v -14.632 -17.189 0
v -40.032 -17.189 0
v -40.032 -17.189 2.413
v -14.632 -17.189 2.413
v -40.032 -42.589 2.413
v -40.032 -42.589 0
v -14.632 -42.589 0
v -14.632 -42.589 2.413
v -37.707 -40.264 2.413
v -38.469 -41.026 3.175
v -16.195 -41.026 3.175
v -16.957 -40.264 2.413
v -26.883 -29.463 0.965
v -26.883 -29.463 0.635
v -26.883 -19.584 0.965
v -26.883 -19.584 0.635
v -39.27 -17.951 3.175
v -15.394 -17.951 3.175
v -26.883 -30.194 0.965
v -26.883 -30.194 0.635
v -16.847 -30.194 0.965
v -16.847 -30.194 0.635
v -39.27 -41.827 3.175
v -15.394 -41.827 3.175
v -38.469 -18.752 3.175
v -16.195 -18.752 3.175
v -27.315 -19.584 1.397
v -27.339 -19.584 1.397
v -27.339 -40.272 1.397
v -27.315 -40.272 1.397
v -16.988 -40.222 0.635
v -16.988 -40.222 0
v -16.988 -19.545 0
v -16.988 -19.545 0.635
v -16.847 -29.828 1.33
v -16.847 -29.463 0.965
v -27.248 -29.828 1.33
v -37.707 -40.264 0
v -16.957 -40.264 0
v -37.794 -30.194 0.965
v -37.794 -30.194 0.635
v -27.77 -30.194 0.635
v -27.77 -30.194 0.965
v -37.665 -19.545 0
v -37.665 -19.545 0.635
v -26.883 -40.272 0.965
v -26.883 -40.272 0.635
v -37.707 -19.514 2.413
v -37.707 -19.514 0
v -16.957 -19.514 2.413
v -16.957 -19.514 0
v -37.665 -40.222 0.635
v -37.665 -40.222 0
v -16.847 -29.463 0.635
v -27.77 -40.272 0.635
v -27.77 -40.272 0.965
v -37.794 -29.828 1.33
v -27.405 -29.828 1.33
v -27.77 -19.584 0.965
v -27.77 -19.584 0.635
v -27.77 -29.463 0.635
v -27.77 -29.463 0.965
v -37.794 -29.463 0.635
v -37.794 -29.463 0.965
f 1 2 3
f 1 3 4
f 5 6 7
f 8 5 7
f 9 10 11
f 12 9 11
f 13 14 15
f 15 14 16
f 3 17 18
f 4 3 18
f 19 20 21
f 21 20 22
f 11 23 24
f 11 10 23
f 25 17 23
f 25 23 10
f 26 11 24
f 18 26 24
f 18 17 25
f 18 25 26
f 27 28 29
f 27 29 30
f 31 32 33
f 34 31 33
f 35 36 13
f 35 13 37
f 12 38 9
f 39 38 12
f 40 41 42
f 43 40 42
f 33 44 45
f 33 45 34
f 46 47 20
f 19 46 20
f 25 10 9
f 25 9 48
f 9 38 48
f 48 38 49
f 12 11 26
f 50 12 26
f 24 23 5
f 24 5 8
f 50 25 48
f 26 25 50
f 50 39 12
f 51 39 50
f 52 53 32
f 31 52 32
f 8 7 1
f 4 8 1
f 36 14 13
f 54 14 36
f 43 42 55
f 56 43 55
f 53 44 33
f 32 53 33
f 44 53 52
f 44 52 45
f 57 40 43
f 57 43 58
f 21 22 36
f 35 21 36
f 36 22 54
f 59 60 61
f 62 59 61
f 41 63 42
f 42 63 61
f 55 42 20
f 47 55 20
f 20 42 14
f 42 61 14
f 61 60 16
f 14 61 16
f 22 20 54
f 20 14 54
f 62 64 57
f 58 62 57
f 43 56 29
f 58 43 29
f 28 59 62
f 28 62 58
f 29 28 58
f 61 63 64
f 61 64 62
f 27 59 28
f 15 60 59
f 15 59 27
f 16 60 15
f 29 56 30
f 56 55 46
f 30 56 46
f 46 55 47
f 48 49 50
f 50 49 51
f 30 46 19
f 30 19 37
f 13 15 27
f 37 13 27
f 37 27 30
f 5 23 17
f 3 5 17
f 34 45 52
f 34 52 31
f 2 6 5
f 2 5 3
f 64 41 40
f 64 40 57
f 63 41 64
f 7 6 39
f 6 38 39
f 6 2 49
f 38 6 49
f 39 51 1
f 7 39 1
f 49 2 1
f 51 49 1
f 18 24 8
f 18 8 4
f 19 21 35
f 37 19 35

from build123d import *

# Parameters (mm, degrees)
F0_W         = 25.4
F0_H         = 25.4
F0_W_2       = 20.7499843091
F0_H_2       = 20.7499843091
F1_DEPTH     = 3.175
F2_W         = 20.6769648939
F2_H         = 20.6769648939
F3_DEPTH     = 0.635
F5_W         = 0.8874461055
F5_H         = 9.8797418177
F5_H_2       = 0.7302556187
F5_W_2       = 10.0232437253
F5_W_3       = 10.0361239165
F5_H_3       = 10.0780427456
F6_DEPTH     = 0.762
F7_T1_DEPTH  = 11.1336964395
F7_T3_DEPTH  = 10.9901945319
F7_T5_DEPTH  = 11.1465766307
F7_T7_DEPTH  = 11.1884954598
F7_T12_DEPTH = 12.2441491537
F7_T17_DEPTH = 12.2441491537
F7_T22_DEPTH = 12.1006472461
F7_T27_DEPTH = 12.1006472461
F7_T32_DEPTH = 12.2570293449
F7_T37_DEPTH = 12.2570293449
F7_T42_DEPTH = 12.298948174
F7_T47_DEPTH = 12.298948174
F7_T53_DEPTH = 12.2441491537
F7_T58_DEPTH = 12.298948174
F7_T66_DEPTH = 12.1006472461
F7_T71_DEPTH = 12.2441491537
F7_T79_DEPTH = 12.2570293449
F7_T84_DEPTH = 12.1006472461
F7_T92_DEPTH = 12.298948174
F7_T97_DEPTH = 12.2570293449
F8_SIZE      = 0.762


# Not quite as in the source:
# - a fillet or chamfer that OpenCascade refuses, or shapes differently, is made with other operations: its cross-section is extruded or revolved along the edge and cut away or added


with BuildPart() as f1:
    # F0 (on Top) → F1 (new body)
    with BuildSketch(Plane.XY):
        with Locations((-27.3323692381, -29.8893228173)):
            Rectangle(F0_W, F0_H)
        with Locations((-27.3323692381, -29.8893228173)):
            Rectangle(F0_W_2, F0_H_2, mode=Mode.SUBTRACT)
    extrude(amount=F1_DEPTH)

    # F8
    f8_edges = [f1.edges().sort_by_distance(p)[0] for p in [
        (-14.632369, -29.889323, 3.175),
        (-27.332369, -42.589323, 3.175),
        (-40.032369, -29.889323, 3.175),
        (-27.332369, -17.189323, 3.175),
        (-37.707361, -29.889323, 3.175),
        (-27.332369, -19.514331, 3.175),
        (-16.957377, -29.889323, 3.175),
        (-27.332369, -40.264315, 3.175),
    ]]
    chamfer(f8_edges, length=F8_SIZE)


with BuildPart() as f3:
    # F2 (on Top) → F3 (new body)
    with BuildSketch(Plane.XY):
        with Locations((-27.32637804, -29.8832794651)):
            Rectangle(F2_W, F2_H)
    extrude(amount=F3_DEPTH)


with BuildPart() as f6:
    # F5 (on face) → F6 (new body)
    with BuildSketch(Plane.XY.offset(0.635)):
        with Locations((-27.3266136646, -24.5234593749)):
            Rectangle(F5_W, F5_H)
        with Locations((-27.3266136646, -29.8284580931)):
            Rectangle(F5_W, F5_H_2)
        with Locations((-32.78195858, -29.8284580931)):
            Rectangle(F5_W_2, F5_H_2)
        with Locations((-21.8648286536, -29.8284580931)):
            Rectangle(F5_W_3, F5_H_2)
        with Locations((-27.3266136646, -35.2326072752)):
            Rectangle(F5_W, F5_H_3)
    extrude(amount=F6_DEPTH)

    # F7: chamfer of 0.4318 on 8 edges, made by hand

    # F7_s2 → F7_t1 (cut)
    with BuildSketch(Plane.YZ.offset(-38.9040331569)):
        Polygon((-30.1935859025, 0.9652), (-29.7617859025, 1.397), (-30.1935859025, 1.397), align=None)
        Polygon((-29.4633302838, 0.9652), (-29.8951302838, 1.397), (-29.4633302838, 1.397), align=None)
    extrude(amount=F7_T1_DEPTH, mode=Mode.SUBTRACT)

    # F7_s4 → F7_t3 (cut)
    with BuildSketch(Plane.XZ.offset(18.4731357518)):
        Polygon((-27.7703367174, 0.9652), (-27.3385367174, 1.397), (-27.7703367174, 1.397), align=None)
        Polygon((-26.8828906119, 0.9652), (-27.3146906119, 1.397), (-26.8828906119, 1.397), align=None)
    extrude(amount=F7_T3_DEPTH, mode=Mode.SUBTRACT)

    # F7_s6 → F7_t5 (cut)
    with BuildSketch(Plane.YZ.offset(-26.8828906119)):
        Polygon((-29.4633302838, 0.9652), (-29.8951302838, 1.397), (-29.4633302838, 1.397), align=None)
        Polygon((-30.1935859025, 0.9652), (-29.7617859025, 1.397), (-30.1935859025, 1.397), align=None)
    extrude(amount=F7_T5_DEPTH, mode=Mode.SUBTRACT)

    # F7_s8 → F7_t7 (cut)
    with BuildSketch(Plane.XZ.offset(30.1935859025)):
        Polygon((-26.8828906119, 0.9652), (-27.3146906119, 1.397), (-26.8828906119, 1.397), align=None)
        Polygon((-27.7703367174, 0.9652), (-27.3385367174, 1.397), (-27.7703367174, 1.397), align=None)
    extrude(amount=F7_T7_DEPTH, mode=Mode.SUBTRACT)


with BuildPart() as f7_tool10:
    # F7_s11 → F7_t12 (new body)
    with BuildSketch(Plane.YZ.offset(-38.9040331569)):
        Polygon((-30.1935859025, 0.9652), (-29.7617859025, 1.397), (-30.1935859025, 1.397), align=None)
    extrude(amount=F7_T12_DEPTH)

    split(bisect_by=Plane.YZ.offset(-26.8828906119), keep=Keep.TOP)


with BuildPart() as f6_1:
    add(f6.part)

    # F7_t9: cut F7_tool10
    add(f7_tool10.part, mode=Mode.SUBTRACT)


with BuildPart() as f7_tool15:
    # F7_s16 → F7_t17 (new body)
    with BuildSketch(Plane.YZ.offset(-26.6598840032)):
        Polygon((-29.4633302838, 0.9652), (-29.8951302838, 1.397), (-29.4633302838, 1.397), align=None)
    extrude(amount=-F7_T17_DEPTH)

    split(bisect_by=Plane.YZ.offset(-26.8828906119), keep=Keep.TOP)


with BuildPart() as f6_2:
    add(f6_1.part)

    # F7_t14: cut F7_tool15
    add(f7_tool15.part, mode=Mode.SUBTRACT)


with BuildPart() as f7_tool20:
    # F7_s21 → F7_t22 (new body)
    with BuildSketch(Plane.XZ.offset(18.4731357518)):
        Polygon((-27.7703367174, 0.9652), (-27.3385367174, 1.397), (-27.7703367174, 1.397), align=None)
    extrude(amount=F7_T22_DEPTH)

    split(bisect_by=Plane.XZ.offset(30.1935859025), keep=Keep.TOP)


with BuildPart() as f6_3:
    add(f6_2.part)

    # F7_t19: cut F7_tool20
    add(f7_tool20.part, mode=Mode.SUBTRACT)


with BuildPart() as f7_tool25:
    # F7_s26 → F7_t27 (new body)
    with BuildSketch(Plane.XZ.offset(30.573782998)):
        Polygon((-26.8828906119, 0.9652), (-27.3146906119, 1.397), (-26.8828906119, 1.397), align=None)
    extrude(amount=-F7_T27_DEPTH)

    split(bisect_by=Plane.XZ.offset(30.1935859025), keep=Keep.TOP)


with BuildPart() as f6_4:
    add(f6_3.part)

    # F7_t24: cut F7_tool25
    add(f7_tool25.part, mode=Mode.SUBTRACT)


with BuildPart() as f7_tool30:
    # F7_s31 → F7_t32 (new body)
    with BuildSketch(Plane.YZ.offset(-15.7363139812)):
        Polygon((-29.4633302838, 0.9652), (-29.8951302838, 1.397), (-29.4633302838, 1.397), align=None)
    extrude(amount=-F7_T32_DEPTH)

    split(bisect_by=Plane.YZ.offset(-27.7703367174), keep=Keep.BOTTOM)


with BuildPart() as f6_5:
    add(f6_4.part)

    # F7_t29: cut F7_tool30
    add(f7_tool30.part, mode=Mode.SUBTRACT)


with BuildPart() as f7_tool35:
    # F7_s36 → F7_t37 (new body)
    with BuildSketch(Plane.YZ.offset(-27.9933433261)):
        Polygon((-30.1935859025, 0.9652), (-29.7617859025, 1.397), (-30.1935859025, 1.397), align=None)
    extrude(amount=F7_T37_DEPTH)

    split(bisect_by=Plane.YZ.offset(-27.7703367174), keep=Keep.BOTTOM)


with BuildPart() as f6_6:
    add(f6_5.part)

    # F7_t34: cut F7_tool35
    add(f7_tool35.part, mode=Mode.SUBTRACT)


with BuildPart() as f7_tool40:
    # F7_s41 → F7_t42 (new body)
    with BuildSketch(Plane.XZ.offset(41.3820813622)):
        Polygon((-26.8828906119, 0.9652), (-27.3146906119, 1.397), (-26.8828906119, 1.397), align=None)
    extrude(amount=-F7_T42_DEPTH)

    split(bisect_by=Plane.XZ.offset(29.4633302838), keep=Keep.BOTTOM)


with BuildPart() as f6_7:
    add(f6_6.part)

    # F7_t39: cut F7_tool40
    add(f7_tool40.part, mode=Mode.SUBTRACT)


with BuildPart() as f7_tool45:
    # F7_s46 → F7_t47 (new body)
    with BuildSketch(Plane.XZ.offset(29.0831331882)):
        Polygon((-27.7703367174, 0.9652), (-27.3385367174, 1.397), (-27.7703367174, 1.397), align=None)
    extrude(amount=F7_T47_DEPTH)

    split(bisect_by=Plane.XZ.offset(29.4633302838), keep=Keep.BOTTOM)


with BuildPart() as f6_8:
    add(f6_7.part)

    # F7_t44: cut F7_tool45
    add(f7_tool45.part, mode=Mode.SUBTRACT)


with BuildPart() as f7_tool51:
    # F7_s52 → F7_t53 (new body)
    with BuildSketch(Plane.YZ.offset(-38.9040331569)):
        Polygon((-30.1935859025, 0.9652), (-29.7617859025, 1.397), (-30.1935859025, 1.397), align=None)
    extrude(amount=F7_T53_DEPTH)

    split(bisect_by=Plane.YZ.offset(-27.7703367174), keep=Keep.TOP)

    split(bisect_by=Plane.YZ.offset(-26.8828906119), keep=Keep.BOTTOM)


with BuildPart() as f7_tool56:
    # F7_s57 → F7_t58 (new body)
    with BuildSketch(Plane.XZ.offset(29.0831331882)):
        Polygon((-27.7703367174, 0.9652), (-27.3385367174, 1.397), (-27.7703367174, 1.397), align=None)
    extrude(amount=F7_T58_DEPTH)

    split(bisect_by=Plane.XZ.offset(29.4633302838), keep=Keep.TOP)

    split(bisect_by=Plane.XZ.offset(30.1935859025), keep=Keep.BOTTOM)


with BuildPart() as f7_tool51_1:
    add(f7_tool51.part)

    # F7_t61: intersect F7_tool56
    add(f7_tool56.part, mode=Mode.INTERSECT)


with BuildPart() as f6_9:
    add(f6_8.part)

    # F7_t49: cut F7_tool51
    add(f7_tool51_1.part, mode=Mode.SUBTRACT)


with BuildPart() as f7_tool64:
    # F7_s65 → F7_t66 (new body)
    with BuildSketch(Plane.XZ.offset(18.4731357518)):
        Polygon((-27.7703367174, 0.9652), (-27.3385367174, 1.397), (-27.7703367174, 1.397), align=None)
    extrude(amount=F7_T66_DEPTH)

    split(bisect_by=Plane.XZ.offset(29.4633302838), keep=Keep.TOP)

    split(bisect_by=Plane.XZ.offset(30.1935859025), keep=Keep.BOTTOM)


with BuildPart() as f7_tool69:
    # F7_s70 → F7_t71 (new body)
    with BuildSketch(Plane.YZ.offset(-26.6598840032)):
        Polygon((-29.4633302838, 0.9652), (-29.8951302838, 1.397), (-29.4633302838, 1.397), align=None)
    extrude(amount=-F7_T71_DEPTH)

    split(bisect_by=Plane.YZ.offset(-27.7703367174), keep=Keep.TOP)

    split(bisect_by=Plane.YZ.offset(-26.8828906119), keep=Keep.BOTTOM)


with BuildPart() as f7_tool64_1:
    add(f7_tool64.part)

    # F7_t74: intersect F7_tool69
    add(f7_tool69.part, mode=Mode.INTERSECT)


with BuildPart() as f6_10:
    add(f6_9.part)

    # F7_t62: cut F7_tool64
    add(f7_tool64_1.part, mode=Mode.SUBTRACT)


with BuildPart() as f7_tool77:
    # F7_s78 → F7_t79 (new body)
    with BuildSketch(Plane.YZ.offset(-15.7363139812)):
        Polygon((-29.4633302838, 0.9652), (-29.8951302838, 1.397), (-29.4633302838, 1.397), align=None)
    extrude(amount=-F7_T79_DEPTH)

    split(bisect_by=Plane.YZ.offset(-27.7703367174), keep=Keep.TOP)

    split(bisect_by=Plane.YZ.offset(-26.8828906119), keep=Keep.BOTTOM)


with BuildPart() as f7_tool82:
    # F7_s83 → F7_t84 (new body)
    with BuildSketch(Plane.XZ.offset(30.573782998)):
        Polygon((-26.8828906119, 0.9652), (-27.3146906119, 1.397), (-26.8828906119, 1.397), align=None)
    extrude(amount=-F7_T84_DEPTH)

    split(bisect_by=Plane.XZ.offset(30.1935859025), keep=Keep.BOTTOM)

    split(bisect_by=Plane.XZ.offset(29.4633302838), keep=Keep.TOP)


with BuildPart() as f7_tool77_1:
    add(f7_tool77.part)

    # F7_t87: intersect F7_tool82
    add(f7_tool82.part, mode=Mode.INTERSECT)


with BuildPart() as f6_11:
    add(f6_10.part)

    # F7_t75: cut F7_tool77
    add(f7_tool77_1.part, mode=Mode.SUBTRACT)


with BuildPart() as f7_tool90:
    # F7_s91 → F7_t92 (new body)
    with BuildSketch(Plane.XZ.offset(41.3820813622)):
        Polygon((-26.8828906119, 0.9652), (-27.3146906119, 1.397), (-26.8828906119, 1.397), align=None)
    extrude(amount=-F7_T92_DEPTH)

    split(bisect_by=Plane.XZ.offset(30.1935859025), keep=Keep.BOTTOM)

    split(bisect_by=Plane.XZ.offset(29.4633302838), keep=Keep.TOP)


with BuildPart() as f7_tool95:
    # F7_s96 → F7_t97 (new body)
    with BuildSketch(Plane.YZ.offset(-27.9933433261)):
        Polygon((-30.1935859025, 0.9652), (-29.7617859025, 1.397), (-30.1935859025, 1.397), align=None)
    extrude(amount=F7_T97_DEPTH)

    split(bisect_by=Plane.YZ.offset(-27.7703367174), keep=Keep.TOP)

    split(bisect_by=Plane.YZ.offset(-26.8828906119), keep=Keep.BOTTOM)


with BuildPart() as f7_tool90_1:
    add(f7_tool90.part)

    # F7_t100: intersect F7_tool95
    add(f7_tool95.part, mode=Mode.INTERSECT)


with BuildPart() as f6_12:
    add(f6_11.part)

    # F7_t88: cut F7_tool90
    add(f7_tool90_1.part, mode=Mode.SUBTRACT)


solid = Compound([f1.part, f3.part, f6_12.part])
